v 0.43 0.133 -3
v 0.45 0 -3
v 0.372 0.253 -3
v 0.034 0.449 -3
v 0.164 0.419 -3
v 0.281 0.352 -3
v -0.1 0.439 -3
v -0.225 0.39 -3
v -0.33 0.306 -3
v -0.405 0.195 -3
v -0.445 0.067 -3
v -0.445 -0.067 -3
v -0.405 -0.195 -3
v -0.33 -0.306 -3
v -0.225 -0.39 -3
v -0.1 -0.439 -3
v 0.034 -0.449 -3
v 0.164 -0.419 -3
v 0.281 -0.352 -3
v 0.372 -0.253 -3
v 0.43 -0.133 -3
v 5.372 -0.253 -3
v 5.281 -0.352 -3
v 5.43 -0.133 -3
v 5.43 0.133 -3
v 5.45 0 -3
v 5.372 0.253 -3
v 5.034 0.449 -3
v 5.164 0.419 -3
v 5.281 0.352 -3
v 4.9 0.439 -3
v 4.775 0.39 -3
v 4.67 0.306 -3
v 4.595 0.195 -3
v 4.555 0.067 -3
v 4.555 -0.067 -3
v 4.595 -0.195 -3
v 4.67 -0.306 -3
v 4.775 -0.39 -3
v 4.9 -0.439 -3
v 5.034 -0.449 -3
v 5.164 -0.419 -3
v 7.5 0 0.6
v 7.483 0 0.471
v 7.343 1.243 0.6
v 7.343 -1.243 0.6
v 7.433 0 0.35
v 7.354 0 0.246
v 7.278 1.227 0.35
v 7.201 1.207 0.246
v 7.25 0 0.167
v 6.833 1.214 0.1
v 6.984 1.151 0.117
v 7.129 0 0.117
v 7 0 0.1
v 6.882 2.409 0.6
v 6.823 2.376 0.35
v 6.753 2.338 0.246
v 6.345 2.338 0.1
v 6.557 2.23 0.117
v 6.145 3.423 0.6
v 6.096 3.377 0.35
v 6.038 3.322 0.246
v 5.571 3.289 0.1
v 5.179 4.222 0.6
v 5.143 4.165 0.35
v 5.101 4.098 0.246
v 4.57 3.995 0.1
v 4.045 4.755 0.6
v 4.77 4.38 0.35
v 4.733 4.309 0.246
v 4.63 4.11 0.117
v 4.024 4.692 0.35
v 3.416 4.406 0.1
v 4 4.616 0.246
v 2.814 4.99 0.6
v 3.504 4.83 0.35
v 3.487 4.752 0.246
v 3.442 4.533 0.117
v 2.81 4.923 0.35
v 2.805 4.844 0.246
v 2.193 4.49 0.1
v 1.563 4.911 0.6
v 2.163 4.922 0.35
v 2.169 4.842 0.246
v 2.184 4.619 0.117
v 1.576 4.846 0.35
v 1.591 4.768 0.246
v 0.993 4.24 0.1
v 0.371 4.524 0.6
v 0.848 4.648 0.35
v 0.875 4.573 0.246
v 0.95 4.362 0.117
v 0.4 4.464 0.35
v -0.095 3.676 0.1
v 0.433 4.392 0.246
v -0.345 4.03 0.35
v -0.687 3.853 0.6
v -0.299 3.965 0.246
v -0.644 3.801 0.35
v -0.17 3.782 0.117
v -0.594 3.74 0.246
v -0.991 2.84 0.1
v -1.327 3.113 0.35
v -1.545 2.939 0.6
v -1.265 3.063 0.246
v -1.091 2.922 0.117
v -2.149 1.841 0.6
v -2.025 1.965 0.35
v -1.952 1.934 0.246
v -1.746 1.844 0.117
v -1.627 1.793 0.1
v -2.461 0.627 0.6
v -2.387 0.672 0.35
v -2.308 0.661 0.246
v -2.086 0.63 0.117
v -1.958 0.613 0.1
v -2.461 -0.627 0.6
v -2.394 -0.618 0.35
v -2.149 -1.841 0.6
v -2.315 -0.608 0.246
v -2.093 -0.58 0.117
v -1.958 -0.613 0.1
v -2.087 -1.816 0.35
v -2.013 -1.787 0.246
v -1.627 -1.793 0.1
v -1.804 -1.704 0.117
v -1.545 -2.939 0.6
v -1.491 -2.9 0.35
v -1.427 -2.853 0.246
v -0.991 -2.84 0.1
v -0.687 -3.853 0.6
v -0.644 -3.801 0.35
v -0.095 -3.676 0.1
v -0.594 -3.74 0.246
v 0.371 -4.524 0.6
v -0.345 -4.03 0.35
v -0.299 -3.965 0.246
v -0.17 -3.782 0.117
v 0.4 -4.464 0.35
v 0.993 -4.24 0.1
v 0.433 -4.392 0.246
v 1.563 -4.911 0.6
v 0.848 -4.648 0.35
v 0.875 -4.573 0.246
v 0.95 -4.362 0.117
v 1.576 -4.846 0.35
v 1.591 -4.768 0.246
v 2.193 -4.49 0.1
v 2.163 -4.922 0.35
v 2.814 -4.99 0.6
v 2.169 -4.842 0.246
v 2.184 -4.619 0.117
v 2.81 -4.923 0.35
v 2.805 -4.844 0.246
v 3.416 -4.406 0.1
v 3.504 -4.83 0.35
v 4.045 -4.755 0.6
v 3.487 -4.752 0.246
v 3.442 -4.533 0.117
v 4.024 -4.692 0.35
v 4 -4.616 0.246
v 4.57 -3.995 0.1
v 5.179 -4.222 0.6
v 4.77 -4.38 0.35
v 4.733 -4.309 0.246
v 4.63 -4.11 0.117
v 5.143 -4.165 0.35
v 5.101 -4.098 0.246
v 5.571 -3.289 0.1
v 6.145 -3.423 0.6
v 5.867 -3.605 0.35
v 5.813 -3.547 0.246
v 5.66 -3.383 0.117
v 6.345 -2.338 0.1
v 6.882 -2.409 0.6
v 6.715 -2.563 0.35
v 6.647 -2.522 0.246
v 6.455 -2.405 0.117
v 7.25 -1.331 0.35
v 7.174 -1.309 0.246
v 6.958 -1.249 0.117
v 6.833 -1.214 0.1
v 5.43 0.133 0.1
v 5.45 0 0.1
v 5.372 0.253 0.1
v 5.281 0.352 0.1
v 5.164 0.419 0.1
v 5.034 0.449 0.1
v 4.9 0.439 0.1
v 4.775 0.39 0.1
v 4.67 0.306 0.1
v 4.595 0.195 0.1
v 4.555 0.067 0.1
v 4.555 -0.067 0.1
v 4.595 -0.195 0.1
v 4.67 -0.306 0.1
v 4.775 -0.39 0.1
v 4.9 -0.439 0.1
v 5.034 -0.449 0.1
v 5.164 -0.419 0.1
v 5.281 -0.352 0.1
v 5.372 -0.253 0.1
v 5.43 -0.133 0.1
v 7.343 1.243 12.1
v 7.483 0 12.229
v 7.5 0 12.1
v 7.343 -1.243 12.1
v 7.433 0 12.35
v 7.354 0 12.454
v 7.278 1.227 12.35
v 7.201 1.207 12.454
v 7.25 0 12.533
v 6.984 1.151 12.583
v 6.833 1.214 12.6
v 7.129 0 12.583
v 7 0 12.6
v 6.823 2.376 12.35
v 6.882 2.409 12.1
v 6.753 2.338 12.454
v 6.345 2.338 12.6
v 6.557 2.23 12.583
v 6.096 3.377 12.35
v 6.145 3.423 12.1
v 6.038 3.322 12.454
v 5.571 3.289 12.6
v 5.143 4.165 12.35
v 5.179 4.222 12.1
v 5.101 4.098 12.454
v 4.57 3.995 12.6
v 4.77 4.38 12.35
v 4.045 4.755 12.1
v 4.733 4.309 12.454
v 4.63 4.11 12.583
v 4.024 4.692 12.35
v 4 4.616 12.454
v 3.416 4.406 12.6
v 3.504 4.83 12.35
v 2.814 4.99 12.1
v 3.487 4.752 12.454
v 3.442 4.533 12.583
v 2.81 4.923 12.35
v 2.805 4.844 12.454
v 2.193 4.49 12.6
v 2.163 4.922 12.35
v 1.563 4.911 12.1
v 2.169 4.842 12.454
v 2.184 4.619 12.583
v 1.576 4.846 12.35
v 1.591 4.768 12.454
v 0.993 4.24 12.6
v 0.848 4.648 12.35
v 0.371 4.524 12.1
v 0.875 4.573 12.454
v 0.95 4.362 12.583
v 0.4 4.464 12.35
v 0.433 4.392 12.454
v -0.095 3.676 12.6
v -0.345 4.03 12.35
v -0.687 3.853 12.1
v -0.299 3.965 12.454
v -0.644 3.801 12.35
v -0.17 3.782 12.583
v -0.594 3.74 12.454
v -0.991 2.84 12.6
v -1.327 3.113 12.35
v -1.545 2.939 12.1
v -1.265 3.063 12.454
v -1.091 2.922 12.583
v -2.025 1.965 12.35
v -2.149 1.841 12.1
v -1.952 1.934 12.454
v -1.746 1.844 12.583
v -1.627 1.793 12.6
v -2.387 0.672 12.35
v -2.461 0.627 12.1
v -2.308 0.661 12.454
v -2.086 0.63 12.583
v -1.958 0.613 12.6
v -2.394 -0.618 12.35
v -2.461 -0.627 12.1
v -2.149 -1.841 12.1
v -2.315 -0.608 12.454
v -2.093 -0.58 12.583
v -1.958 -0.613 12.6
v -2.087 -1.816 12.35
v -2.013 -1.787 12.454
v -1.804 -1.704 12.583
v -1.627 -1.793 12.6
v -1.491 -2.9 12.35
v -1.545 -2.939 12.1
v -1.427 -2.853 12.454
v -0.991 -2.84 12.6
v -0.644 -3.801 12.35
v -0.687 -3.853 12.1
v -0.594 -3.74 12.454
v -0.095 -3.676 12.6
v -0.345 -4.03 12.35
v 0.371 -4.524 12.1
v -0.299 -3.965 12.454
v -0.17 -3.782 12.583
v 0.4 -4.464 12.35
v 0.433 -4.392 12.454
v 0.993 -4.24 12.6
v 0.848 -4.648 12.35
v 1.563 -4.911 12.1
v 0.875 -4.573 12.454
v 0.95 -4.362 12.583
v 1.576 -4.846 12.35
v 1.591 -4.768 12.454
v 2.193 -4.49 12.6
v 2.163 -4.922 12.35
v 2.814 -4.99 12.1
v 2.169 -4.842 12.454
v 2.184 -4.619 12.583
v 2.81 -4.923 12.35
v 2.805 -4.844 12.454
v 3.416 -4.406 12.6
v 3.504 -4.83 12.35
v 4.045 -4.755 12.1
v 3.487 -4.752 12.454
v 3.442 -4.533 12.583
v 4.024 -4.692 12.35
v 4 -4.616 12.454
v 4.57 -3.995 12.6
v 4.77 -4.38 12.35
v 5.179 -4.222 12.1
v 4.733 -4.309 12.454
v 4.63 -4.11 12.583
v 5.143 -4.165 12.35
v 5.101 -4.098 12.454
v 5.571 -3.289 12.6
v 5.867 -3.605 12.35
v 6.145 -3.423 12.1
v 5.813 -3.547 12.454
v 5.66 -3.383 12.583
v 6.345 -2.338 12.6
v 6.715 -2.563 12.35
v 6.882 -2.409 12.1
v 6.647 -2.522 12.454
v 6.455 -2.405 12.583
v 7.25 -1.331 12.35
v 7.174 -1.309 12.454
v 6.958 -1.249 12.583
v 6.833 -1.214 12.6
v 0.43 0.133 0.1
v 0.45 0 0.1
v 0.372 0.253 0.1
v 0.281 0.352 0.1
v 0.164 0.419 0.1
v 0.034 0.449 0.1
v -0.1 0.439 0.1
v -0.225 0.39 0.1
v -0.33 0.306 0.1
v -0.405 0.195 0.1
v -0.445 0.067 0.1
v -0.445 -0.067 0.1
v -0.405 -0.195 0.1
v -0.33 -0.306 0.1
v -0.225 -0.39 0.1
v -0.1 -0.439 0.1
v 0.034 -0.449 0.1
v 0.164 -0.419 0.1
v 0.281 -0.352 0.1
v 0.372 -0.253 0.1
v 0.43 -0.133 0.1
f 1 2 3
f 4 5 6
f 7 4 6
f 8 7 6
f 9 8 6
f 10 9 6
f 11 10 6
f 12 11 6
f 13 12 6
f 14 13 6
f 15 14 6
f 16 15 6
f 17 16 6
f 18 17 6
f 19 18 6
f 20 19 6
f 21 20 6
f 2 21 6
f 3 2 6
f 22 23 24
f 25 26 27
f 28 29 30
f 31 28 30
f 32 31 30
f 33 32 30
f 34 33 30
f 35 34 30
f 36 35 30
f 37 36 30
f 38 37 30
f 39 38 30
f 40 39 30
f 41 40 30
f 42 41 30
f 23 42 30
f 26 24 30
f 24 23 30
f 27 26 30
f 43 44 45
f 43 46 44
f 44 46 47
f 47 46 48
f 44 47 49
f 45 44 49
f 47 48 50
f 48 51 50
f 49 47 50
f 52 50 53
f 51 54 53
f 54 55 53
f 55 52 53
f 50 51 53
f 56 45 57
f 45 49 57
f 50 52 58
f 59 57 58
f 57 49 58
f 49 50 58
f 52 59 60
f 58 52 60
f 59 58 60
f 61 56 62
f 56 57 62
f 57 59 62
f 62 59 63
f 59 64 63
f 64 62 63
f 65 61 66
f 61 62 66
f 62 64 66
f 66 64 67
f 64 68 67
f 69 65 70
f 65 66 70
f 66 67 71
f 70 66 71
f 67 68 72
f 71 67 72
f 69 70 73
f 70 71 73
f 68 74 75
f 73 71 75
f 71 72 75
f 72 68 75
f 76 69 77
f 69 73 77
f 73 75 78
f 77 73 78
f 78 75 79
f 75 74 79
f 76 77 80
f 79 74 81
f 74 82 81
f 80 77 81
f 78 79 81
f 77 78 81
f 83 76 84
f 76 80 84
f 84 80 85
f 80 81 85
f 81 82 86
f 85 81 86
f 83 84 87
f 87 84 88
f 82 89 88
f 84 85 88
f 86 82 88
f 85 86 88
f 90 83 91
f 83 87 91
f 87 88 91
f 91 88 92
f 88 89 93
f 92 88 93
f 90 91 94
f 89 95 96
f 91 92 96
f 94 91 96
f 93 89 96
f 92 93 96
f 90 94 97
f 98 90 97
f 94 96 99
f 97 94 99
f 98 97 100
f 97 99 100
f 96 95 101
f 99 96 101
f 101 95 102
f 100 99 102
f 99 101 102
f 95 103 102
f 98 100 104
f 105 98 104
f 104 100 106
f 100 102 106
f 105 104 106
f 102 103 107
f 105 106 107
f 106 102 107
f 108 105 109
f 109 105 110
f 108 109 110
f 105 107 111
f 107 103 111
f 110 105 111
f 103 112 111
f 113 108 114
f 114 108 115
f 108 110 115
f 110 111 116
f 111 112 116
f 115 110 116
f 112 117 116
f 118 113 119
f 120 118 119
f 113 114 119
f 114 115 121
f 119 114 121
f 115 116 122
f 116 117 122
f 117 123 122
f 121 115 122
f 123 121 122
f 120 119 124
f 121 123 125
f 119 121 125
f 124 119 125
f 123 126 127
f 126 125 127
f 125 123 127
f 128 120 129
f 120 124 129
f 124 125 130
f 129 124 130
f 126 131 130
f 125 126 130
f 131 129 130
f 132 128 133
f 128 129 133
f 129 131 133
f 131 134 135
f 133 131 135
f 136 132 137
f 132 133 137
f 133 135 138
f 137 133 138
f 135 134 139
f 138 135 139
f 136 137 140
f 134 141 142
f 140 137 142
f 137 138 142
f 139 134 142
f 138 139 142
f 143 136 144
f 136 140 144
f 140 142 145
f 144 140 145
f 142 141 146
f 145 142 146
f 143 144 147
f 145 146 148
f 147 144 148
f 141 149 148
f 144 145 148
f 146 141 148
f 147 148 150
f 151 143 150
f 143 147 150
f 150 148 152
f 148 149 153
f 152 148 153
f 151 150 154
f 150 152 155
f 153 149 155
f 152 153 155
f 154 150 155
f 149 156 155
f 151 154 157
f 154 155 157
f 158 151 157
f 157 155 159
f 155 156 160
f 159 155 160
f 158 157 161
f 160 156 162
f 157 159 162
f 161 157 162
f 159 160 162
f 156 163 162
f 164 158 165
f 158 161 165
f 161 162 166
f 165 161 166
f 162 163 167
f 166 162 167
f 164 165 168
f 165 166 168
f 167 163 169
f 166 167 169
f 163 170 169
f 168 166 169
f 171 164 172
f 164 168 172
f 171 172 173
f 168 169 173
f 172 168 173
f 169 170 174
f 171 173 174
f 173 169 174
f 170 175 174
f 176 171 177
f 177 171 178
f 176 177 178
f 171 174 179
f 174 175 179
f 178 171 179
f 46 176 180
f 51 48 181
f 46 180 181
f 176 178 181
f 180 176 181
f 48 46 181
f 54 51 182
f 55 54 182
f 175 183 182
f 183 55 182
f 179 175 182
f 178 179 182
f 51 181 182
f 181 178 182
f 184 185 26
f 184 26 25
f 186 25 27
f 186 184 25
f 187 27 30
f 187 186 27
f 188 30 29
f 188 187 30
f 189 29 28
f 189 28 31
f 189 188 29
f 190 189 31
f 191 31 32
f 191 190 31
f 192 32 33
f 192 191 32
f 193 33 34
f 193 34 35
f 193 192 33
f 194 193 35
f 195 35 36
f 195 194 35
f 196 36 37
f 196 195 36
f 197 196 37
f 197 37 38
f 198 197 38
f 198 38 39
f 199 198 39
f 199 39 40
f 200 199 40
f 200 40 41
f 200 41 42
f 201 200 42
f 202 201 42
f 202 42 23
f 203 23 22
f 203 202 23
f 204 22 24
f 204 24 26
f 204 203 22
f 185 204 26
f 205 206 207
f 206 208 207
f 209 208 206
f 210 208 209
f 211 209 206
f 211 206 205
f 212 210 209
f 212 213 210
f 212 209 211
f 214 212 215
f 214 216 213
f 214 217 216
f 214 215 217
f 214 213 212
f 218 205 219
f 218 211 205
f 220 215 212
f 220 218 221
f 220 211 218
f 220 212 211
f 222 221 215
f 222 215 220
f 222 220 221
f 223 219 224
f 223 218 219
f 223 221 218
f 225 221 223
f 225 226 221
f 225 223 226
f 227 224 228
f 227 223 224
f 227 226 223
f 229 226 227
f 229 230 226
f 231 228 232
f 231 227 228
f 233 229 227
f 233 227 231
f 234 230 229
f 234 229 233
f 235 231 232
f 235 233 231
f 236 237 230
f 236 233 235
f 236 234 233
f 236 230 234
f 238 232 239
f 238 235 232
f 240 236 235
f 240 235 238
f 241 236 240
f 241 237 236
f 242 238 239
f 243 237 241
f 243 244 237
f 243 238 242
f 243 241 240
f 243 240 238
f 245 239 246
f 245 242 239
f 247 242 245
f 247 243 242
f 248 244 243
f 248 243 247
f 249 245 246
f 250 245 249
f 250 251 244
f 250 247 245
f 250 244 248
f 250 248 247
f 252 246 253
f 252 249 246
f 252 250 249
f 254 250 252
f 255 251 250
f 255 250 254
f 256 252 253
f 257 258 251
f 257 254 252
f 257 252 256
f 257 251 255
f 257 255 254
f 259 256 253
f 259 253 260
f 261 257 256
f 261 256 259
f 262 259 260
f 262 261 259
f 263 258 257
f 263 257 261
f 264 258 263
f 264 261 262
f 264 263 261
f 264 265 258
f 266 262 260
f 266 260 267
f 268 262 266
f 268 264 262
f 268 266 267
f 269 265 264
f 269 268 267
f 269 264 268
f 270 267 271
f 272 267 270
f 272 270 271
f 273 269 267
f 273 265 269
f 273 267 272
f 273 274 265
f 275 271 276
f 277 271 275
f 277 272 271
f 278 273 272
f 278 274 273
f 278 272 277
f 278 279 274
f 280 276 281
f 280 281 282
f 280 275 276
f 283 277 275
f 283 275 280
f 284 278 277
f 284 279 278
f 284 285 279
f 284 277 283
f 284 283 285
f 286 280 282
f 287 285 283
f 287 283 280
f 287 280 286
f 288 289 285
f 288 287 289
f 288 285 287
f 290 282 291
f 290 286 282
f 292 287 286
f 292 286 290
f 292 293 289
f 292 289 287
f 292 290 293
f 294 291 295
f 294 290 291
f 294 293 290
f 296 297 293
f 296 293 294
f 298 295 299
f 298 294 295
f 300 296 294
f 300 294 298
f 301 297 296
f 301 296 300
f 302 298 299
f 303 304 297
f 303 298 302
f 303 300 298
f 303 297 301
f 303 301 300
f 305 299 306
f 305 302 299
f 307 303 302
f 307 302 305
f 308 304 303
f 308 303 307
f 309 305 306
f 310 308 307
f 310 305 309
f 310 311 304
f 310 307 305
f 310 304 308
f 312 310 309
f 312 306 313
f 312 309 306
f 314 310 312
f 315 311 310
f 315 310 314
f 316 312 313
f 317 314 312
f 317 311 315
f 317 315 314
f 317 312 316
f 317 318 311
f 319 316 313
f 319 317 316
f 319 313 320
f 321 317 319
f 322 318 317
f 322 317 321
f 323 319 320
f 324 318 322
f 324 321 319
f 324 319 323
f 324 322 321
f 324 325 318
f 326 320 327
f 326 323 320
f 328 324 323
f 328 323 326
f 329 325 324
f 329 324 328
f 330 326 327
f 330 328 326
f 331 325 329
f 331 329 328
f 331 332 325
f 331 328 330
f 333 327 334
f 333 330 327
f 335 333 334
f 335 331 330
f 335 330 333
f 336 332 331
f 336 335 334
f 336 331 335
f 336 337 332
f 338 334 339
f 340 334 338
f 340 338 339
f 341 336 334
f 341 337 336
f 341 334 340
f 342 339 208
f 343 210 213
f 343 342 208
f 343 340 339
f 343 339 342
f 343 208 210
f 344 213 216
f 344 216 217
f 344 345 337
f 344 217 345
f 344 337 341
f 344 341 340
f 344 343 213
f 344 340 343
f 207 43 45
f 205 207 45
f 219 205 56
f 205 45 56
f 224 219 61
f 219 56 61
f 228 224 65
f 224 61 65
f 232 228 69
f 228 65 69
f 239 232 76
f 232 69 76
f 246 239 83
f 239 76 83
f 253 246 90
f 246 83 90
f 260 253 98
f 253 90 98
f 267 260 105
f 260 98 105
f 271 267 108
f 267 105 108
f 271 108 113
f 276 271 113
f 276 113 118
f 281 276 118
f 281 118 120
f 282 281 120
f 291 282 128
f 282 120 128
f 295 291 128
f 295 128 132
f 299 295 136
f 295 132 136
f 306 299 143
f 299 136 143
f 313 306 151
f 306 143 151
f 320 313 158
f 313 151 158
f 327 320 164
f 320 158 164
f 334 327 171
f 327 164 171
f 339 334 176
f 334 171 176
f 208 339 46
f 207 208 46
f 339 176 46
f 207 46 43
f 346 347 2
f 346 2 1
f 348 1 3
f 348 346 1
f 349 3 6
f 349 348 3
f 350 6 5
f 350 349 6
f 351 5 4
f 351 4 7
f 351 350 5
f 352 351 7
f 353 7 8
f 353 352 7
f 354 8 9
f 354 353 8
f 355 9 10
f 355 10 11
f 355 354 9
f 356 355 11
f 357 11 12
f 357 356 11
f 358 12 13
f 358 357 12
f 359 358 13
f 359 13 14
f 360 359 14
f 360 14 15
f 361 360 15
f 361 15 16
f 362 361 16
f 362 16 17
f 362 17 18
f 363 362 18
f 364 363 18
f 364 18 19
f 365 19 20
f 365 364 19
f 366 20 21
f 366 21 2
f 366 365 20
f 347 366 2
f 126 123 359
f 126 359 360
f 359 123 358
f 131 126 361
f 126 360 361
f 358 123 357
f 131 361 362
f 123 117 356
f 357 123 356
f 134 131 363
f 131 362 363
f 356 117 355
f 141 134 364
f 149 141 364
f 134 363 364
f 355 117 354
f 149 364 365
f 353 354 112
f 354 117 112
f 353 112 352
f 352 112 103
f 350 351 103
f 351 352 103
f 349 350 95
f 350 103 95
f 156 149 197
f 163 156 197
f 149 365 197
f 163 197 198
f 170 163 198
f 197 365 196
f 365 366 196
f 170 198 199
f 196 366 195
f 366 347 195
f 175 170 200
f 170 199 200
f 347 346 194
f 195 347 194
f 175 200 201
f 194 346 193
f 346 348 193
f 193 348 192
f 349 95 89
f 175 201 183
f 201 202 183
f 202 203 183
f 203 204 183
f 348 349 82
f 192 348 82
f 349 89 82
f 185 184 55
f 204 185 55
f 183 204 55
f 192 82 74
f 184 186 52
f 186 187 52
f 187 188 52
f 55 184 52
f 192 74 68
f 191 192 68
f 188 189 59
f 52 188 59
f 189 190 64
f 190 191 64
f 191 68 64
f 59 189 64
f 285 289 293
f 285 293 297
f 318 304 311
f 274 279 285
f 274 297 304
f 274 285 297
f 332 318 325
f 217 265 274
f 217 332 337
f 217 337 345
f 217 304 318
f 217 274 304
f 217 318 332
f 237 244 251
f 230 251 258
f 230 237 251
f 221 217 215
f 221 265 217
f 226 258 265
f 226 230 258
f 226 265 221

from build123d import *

# Parameters (mm, degrees)
SKETCH001_R       = 0.45
PAD001_DEPTH      = 6.25
PAD001_DEPTH_BACK = 3.5
SKETCH_R          = 5
PAD_DEPTH         = 12.5
FILLET_R          = 0.5


with BuildPart() as pad001:
    # Sketch001 → Pad001 (new body, two sides)
    with BuildSketch(Plane.XY.offset(0.5)) as pad001_sk:
        Circle(SKETCH001_R)
        with Locations((5, 0)):
            Circle(SKETCH001_R)
    extrude(amount=PAD001_DEPTH)
    extrude(pad001_sk.sketch, amount=-PAD001_DEPTH_BACK)


with BuildPart() as fillet_mp_cp:
    # Sketch → Pad (new body)
    with BuildSketch(Plane.XY.offset(0.1)):
        with Locations((2.5, 0)):
            Circle(SKETCH_R)
    extrude(amount=PAD_DEPTH)

    # Fillet
    fillet_edges = [fillet_mp_cp.edges().sort_by_distance(p)[0] for p in [
        (-2.5, 0, 0.1),
        (-2.5, 0, 12.6),
    ]]
    fillet(fillet_edges, radius=FILLET_R)

    # Fillet_mp_cp: union Pad001
    add(pad001.part)


solid = fillet_mp_cp.part
